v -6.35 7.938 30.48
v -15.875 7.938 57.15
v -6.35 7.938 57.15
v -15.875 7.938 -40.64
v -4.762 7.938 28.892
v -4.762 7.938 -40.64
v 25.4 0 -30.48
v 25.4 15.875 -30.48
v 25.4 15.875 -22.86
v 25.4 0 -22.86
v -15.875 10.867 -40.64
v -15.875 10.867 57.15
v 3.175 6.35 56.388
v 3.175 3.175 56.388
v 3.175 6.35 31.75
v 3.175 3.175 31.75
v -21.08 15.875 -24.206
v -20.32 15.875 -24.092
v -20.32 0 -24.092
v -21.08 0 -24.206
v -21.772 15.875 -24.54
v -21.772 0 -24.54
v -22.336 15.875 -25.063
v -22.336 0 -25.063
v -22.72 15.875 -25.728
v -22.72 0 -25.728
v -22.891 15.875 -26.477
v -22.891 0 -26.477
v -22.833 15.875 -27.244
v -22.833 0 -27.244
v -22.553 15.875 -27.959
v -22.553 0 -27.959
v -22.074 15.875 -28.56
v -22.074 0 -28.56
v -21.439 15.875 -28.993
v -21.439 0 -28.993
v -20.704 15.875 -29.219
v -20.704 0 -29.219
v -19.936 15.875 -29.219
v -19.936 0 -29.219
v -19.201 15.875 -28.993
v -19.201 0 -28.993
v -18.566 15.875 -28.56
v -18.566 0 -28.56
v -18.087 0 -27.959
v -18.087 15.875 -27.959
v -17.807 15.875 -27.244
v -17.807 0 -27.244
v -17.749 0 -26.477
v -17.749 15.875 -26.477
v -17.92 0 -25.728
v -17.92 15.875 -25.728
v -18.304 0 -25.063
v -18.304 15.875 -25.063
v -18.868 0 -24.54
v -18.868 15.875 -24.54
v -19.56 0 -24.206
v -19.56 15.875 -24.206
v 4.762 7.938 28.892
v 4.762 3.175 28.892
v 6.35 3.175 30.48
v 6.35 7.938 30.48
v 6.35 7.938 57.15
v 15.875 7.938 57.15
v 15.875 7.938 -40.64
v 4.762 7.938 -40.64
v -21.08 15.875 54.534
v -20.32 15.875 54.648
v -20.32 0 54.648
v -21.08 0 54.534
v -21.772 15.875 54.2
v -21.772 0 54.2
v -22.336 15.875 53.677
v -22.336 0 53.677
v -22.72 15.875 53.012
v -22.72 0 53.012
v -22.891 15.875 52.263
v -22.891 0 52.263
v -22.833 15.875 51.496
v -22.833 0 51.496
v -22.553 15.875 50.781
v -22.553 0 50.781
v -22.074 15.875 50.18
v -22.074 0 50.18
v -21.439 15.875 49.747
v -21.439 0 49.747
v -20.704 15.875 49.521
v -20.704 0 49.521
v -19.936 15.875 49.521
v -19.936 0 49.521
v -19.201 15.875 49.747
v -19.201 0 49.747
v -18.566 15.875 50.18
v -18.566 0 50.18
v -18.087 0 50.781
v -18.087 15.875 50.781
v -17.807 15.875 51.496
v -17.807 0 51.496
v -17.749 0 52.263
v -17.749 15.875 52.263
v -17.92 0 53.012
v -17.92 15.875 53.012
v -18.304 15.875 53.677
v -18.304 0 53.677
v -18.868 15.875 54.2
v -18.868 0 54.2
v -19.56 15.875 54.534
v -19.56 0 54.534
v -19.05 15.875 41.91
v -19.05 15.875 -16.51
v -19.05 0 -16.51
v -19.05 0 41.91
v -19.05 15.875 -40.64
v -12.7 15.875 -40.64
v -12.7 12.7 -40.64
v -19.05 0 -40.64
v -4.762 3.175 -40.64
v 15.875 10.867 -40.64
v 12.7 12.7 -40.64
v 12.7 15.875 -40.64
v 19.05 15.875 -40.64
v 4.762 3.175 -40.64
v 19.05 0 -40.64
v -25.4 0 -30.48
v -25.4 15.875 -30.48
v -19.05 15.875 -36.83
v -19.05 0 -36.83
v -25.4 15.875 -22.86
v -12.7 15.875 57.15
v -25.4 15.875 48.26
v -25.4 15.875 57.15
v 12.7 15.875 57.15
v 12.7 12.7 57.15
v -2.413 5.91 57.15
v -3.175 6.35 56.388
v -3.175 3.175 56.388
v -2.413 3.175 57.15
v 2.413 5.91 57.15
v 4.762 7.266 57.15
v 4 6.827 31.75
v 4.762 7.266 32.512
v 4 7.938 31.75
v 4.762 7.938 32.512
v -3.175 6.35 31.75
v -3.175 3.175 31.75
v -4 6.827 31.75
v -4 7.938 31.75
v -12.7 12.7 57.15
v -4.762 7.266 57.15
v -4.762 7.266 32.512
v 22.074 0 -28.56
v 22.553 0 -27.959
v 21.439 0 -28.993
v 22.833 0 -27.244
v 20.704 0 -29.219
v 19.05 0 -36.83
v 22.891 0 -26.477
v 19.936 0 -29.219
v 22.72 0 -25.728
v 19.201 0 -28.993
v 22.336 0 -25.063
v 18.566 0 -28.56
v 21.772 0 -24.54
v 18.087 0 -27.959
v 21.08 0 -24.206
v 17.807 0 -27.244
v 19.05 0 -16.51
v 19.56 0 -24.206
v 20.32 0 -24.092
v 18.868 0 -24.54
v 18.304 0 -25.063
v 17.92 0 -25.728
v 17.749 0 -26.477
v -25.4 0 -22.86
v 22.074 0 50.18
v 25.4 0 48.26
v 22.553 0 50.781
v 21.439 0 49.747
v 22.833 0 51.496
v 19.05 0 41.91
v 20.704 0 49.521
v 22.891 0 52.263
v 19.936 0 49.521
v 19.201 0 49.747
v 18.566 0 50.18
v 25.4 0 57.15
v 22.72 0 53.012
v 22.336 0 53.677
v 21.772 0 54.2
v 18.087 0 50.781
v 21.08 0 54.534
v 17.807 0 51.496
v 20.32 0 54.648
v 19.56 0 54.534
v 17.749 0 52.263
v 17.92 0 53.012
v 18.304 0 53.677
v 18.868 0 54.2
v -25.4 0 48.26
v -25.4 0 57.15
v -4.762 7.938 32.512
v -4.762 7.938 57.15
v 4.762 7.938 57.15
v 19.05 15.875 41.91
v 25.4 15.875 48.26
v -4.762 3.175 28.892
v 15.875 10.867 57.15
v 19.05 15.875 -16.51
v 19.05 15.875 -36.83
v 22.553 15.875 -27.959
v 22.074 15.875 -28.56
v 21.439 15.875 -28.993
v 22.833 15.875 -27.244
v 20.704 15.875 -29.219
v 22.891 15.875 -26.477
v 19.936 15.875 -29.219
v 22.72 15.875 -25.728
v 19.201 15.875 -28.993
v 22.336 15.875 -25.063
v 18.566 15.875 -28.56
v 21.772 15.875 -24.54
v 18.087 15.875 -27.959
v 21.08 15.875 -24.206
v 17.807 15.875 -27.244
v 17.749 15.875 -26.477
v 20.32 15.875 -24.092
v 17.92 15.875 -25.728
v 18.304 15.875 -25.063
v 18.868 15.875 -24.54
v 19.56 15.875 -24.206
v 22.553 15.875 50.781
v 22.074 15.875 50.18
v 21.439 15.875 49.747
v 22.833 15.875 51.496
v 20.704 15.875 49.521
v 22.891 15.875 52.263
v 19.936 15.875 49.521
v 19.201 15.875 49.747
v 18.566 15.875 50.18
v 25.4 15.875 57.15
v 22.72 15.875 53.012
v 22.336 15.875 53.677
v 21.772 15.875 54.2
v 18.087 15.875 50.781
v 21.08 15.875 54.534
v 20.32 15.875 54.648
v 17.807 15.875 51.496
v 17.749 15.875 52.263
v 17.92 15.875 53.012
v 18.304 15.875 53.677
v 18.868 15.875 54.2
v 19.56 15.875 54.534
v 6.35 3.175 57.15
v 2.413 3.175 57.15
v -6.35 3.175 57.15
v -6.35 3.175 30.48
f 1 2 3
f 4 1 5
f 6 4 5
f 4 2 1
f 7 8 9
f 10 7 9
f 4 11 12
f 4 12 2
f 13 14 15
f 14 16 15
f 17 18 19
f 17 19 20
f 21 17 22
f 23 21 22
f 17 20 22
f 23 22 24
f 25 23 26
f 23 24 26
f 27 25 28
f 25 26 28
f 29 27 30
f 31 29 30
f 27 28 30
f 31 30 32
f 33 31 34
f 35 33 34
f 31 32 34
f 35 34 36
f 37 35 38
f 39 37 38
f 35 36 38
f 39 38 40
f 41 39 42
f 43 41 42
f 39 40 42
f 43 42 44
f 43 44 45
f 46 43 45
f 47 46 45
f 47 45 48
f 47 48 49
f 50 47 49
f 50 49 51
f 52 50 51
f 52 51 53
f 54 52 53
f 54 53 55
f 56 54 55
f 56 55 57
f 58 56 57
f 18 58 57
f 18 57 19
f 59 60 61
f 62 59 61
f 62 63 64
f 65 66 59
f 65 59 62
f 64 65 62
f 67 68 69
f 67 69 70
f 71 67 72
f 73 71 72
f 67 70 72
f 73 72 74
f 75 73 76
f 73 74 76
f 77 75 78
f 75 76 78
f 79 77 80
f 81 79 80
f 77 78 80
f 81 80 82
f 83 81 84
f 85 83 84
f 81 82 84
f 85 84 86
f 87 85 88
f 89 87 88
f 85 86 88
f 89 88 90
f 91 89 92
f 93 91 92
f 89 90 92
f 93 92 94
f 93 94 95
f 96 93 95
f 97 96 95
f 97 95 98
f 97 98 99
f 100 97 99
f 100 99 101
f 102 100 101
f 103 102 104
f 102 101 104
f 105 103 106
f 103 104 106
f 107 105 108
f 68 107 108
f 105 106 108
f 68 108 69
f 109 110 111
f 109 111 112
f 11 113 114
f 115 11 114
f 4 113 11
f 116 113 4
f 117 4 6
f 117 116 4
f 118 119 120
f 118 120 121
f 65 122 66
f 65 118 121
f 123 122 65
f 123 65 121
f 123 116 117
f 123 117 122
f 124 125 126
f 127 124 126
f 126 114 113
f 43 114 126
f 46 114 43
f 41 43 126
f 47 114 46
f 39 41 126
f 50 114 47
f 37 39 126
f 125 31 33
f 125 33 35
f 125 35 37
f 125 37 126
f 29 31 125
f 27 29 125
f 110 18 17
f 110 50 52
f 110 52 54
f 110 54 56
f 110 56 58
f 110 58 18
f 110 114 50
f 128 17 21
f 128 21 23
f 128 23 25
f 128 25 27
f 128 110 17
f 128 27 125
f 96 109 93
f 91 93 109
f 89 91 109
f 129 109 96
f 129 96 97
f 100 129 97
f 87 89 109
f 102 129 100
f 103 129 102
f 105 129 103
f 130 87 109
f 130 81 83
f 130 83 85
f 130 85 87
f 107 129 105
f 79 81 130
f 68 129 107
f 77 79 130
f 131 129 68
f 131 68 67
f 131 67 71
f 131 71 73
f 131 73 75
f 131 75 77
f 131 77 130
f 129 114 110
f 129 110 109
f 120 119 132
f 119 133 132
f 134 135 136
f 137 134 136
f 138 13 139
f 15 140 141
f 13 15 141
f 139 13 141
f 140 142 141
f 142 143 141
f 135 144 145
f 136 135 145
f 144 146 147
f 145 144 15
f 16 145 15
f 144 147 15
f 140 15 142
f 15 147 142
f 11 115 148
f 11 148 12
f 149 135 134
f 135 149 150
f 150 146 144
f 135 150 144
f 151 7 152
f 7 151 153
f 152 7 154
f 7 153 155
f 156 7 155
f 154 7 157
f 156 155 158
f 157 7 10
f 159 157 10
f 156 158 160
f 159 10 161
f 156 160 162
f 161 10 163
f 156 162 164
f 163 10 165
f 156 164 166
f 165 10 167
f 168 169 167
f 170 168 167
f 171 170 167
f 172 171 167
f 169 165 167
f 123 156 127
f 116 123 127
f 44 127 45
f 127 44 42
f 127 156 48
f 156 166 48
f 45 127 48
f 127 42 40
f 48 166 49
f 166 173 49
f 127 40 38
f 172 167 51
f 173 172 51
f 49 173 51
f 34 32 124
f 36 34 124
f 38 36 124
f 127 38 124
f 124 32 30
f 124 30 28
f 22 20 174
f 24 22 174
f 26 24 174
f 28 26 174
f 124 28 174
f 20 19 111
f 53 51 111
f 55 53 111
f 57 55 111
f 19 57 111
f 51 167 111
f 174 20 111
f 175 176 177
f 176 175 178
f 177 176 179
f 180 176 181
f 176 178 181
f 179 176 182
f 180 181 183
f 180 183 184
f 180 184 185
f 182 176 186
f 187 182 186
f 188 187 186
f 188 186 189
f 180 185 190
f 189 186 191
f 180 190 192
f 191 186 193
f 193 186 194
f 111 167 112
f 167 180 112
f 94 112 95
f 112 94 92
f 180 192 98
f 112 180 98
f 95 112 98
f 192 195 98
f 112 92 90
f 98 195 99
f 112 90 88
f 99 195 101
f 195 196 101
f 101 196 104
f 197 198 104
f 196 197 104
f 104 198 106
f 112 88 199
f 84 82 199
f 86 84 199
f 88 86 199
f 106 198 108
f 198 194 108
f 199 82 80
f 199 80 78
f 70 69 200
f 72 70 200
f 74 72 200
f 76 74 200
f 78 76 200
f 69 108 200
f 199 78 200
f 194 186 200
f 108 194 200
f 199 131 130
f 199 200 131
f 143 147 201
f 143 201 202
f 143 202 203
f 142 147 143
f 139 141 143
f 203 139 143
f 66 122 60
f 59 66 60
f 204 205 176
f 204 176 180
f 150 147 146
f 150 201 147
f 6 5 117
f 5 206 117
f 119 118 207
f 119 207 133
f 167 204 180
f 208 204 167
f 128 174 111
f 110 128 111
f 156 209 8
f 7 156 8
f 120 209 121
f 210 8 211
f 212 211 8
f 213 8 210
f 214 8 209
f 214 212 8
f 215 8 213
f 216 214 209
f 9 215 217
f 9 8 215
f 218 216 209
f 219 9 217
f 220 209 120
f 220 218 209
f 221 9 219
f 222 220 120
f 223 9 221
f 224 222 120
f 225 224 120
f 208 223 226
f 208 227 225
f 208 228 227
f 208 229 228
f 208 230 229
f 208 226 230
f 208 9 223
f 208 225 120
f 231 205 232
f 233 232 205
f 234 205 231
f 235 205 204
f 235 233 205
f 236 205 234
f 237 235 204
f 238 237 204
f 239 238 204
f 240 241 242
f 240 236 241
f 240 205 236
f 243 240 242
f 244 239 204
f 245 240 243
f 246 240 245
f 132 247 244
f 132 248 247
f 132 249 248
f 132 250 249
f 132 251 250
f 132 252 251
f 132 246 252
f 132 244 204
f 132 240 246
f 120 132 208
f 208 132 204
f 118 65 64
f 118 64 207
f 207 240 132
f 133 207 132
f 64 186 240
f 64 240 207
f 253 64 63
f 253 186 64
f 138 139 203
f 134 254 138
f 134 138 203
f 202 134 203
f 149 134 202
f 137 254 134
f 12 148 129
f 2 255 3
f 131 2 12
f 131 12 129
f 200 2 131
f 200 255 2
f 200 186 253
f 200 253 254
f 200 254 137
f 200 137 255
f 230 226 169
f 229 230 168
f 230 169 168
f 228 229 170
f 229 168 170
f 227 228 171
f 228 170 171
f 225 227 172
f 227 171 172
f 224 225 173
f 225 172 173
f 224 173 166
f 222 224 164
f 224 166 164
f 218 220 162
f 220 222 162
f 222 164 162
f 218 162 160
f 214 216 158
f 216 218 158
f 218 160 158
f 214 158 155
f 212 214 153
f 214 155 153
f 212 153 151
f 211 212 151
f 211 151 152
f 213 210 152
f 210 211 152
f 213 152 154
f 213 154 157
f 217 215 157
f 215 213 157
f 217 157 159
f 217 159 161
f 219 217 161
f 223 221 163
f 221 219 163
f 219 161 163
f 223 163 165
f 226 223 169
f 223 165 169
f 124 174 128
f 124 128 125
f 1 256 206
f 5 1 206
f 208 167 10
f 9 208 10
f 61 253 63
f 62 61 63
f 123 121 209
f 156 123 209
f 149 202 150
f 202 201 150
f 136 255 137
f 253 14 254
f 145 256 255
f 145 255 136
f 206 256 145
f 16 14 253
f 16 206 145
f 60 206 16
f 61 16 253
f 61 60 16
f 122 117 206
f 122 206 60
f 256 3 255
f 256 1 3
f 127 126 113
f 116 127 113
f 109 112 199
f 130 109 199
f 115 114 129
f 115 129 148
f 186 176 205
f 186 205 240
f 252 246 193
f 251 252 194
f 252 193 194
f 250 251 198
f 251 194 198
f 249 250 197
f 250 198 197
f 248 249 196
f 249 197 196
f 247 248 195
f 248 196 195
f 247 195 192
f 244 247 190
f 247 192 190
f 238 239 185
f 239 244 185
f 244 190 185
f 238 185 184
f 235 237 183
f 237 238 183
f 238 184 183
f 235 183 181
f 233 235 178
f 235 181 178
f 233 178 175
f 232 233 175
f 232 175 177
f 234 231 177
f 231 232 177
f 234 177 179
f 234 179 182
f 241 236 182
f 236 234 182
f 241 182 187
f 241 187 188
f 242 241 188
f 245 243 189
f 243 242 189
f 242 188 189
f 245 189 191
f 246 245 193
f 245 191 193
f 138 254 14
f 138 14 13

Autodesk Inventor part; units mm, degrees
ref_plane "YZ Plane" through (0, 0, 0) normal (1, 0, 0) x (0, 1, 0)
ref_plane "XZ Plane" through (0, 0, 0) normal (0, 1, 0) x (-1, 0, 0)
sketch "Sketch1" plane through (0, 0, 0) normal (0, 1, 0) x (-1, 0, 0)
  line L0 (-25.4, 57.15) -> (25.4, 57.15)
  line L1 (25.4, 57.15) -> (25.4, -57.15)
  line L2 (25.4, -57.15) -> (-25.4, -57.15)
  line L3 (-25.4, -57.15) -> (-25.4, 57.15)
  line L4 (-25.4, 57.15) -> (25.4, -57.15) construction
  line L5 (25.4, 57.15) -> (-25.4, -57.15) construction
  point P0 (0, 0)
  dimension "d0" = 50.8
  dimension "d1" = 114.3
extrude "Extrusion1" add sketch "Sketch1" along normal blind 15.875
ref_plane "Work Plane1" through (-25.4, 0, 31.75) normal (0, 0, 1) x (1, 0, 0)
sketch "Sketch2" plane through (-25.4, 0, 31.75) normal (0, 0, 1) x (1, 0, 0)
  line L0 (50.8, 0) -> (0, 0) construction
  line L1 (50.8, 0) -> (50.8, 15.875) construction
  line L2 (0, 15.875) -> (50.8, 15.875) construction
  line L3 (0, 0) -> (0, 15.875) construction
  line L4 (0, 15.875) -> (50.8, 15.875) construction
  line L5 (25.4, 15.875) -> (25.4, 0) construction
  line L6 (50.8, 0) -> (0, 0) construction
  line L7 (6.35, 15.875) -> (6.35, 0) construction
  circle A0 centre (25.4, 16.891) radius 5.08 construction
  line L8 (12.7, 15.875) -> (12.7, 12.7)
  line L9 (12.7, 12.7) -> (9.525, 10.8669)
  line L10 (9.525, 10.8669) -> (9.525, 7.9375)
  line L11 (9.525, 7.9375) -> (19.05, 7.9375)
  line L12 (19.05, 7.9375) -> (19.05, 3.175)
  line L13 (19.05, 3.175) -> (25.4, 3.175)
  line L14 (12.7, 15.875) -> (25.4, 15.875)
  line L15 (25.4, 15.875) -> (25.4, 3.175)
  line L16 (19.05, 7.9375) -> (25.4, 7.9375)
  line L17 (20.6375, 7.9375) -> (20.6375, 7.2665)
  line L18 (20.6375, 7.2665) -> (22.225, 6.35)
  line L19 (22.225, 6.35) -> (22.225, 3.175)
  point P0 (22.225, 4.7625)
  point P1 (19.05, 5.5562)
  dimension "d20" = 6.35
  dimension "d21" = 10.16
  dimension "d22" = 6.35
  dimension "d23" = 4.7625
  dimension "d24" = 3.175
  dimension "d25" = 3.175
  dimension "d26" = 30
  dimension "d27" = 3.175
  dimension "d28" = 3.175
  dimension "d29" = 1.016
  dimension "d45" = 1.5875
  dimension "d46" = 3.175
  dimension "d48" = 3.175
  dimension "d50" = 30
extrude "Extrusion2" cut sketch "Sketch2" against normal through all
extrude "Extrusion3" cut sketch "Sketch2" along normal through all contours L14 L15 L16 L11 L10 L9 L8 | L17 L18 L19 L13 L12 L16
sketch "Sketch7" plane through (-6.35, 3.175, -57.15) normal (0, 1, 0) x (1, 0, 0)
  line L0 (0, -114.3) -> (0, 0) construction
  line L1 (6.35, -114.3) -> (1.5875, -114.3) construction
  line L2 (6.35, -88.9) -> (6.35, -114.3) construction
  line L3 (1.5875, -88.9) -> (6.35, -88.9) construction
  line L4 (1.5875, -88.9) -> (1.5875, -114.3) construction
  line L5 (0, -87.63) -> (1.5875, -86.0425)
  line L6 (1.5875, -86.0425) -> (1.5875, 0)
  line L7 (-19.05, 0) -> (31.75, 0) projected
  line L8 (0, 0) -> (1.5875, 0)
  line L9 (0, 0) -> (0, -87.63)
  point P0 (6.35, -57.15)
  dimension "d63" = 135
  dimension "d64" = 1.5875
  dimension "d65" = 1.27
extrude "Extrusion6" add sketch "Sketch7" along normal up to surface (4.7625 mm away)
chamfer "Chamfer2" distance 0.762 angle 45 2 edges at (-4.7625, 7.602, 31.75) (-3.175, 4.7625, 57.15)
sketch "Sketch8" plane through (0, 15.875, 0) normal (0, 1, 0) x (1, 0, 0)
  circle A0 centre (-20.32, 26.67) radius 2.5797 construction
  line L0 (-12.7, 57.15) -> (-25.4, 57.15) construction
  line L1 (-25.4, 57.15) -> (-25.4, -57.15) construction
  line L2 (-15.875, -57.15) -> (-15.875, 57.15) construction
  line L3 (-25.4, -57.15) -> (25.4, -57.15) projected
  line L4 (-25.4, 22.86) -> (-19.05, 16.51)
  line L5 (-19.05, 16.51) -> (-19.05, -41.91)
  line L6 (-19.05, -41.91) -> (-25.4, -48.26)
  line L7 (-25.4, 22.86) -> (-25.4, -48.26)
  line L8 (-25.4, -57.15) -> (-25.4, 57.15) construction
  line L9 (-25.4, 30.48) -> (-19.05, 36.83)
  line L10 (-19.05, 36.83) -> (-19.05, 57.15)
  line L11 (-25.4, 30.48) -> (-25.4, 22.86) construction
  line L12 (-25.4, 30.48) -> (-25.4, 57.15)
  line L13 (-25.4, 57.15) -> (-19.05, 57.15)
  point P0 (0, 0)
  point P1 (-20.32, -52.07)
  point P2 (-12.7, -57.15)
  point P3 (-25.4, 26.67)
  dimension "d71" = 5.1594
  dimension "d72" = 30.48
  dimension "d73" = 5.08
  dimension "d75" = 135
  dimension "d76" = 135
  dimension "d77" = 3.175
  dimension "d89" = 34.29
  dimension "d91" = 5.08
  dimension "d92" = 8.89
hole "Hole2" at (-20.32, 15.875, -26.67) at (-20.32, 15.875, 52.07) direction (0, -1, 0) diameter 5.1562 end through all
extrude "Extrusion7" cut sketch "Sketch8" against normal through all
mirror "Mirror1" about plane through (0, 15.875, 31.75) normal (-1, 0, 0) of "Extrusion2", "Extrusion3", "Extrusion7", "Hole2", "Chamfer2", "Extrusion6"
sketch "Sketch9" plane through (0, 0, 0) normal (0, -1, 0) x (1, 0, 0)
  line L0 (19.05, -57.15) -> (19.05, -36.83) projected
  line L1 (19.05, -57.15) -> (12.7, -57.15) projected
  line L2 (-19.05, -57.15) -> (-19.05, -36.83) projected
  line L3 (19.05, -57.15) -> (-19.05, -57.15)
  line L4 (-19.05, -57.15) -> (-19.05, -40.64)
  line L5 (-19.05, -40.64) -> (19.05, -40.64)
  line L6 (19.05, -40.64) -> (19.05, -57.15)
  point P0 (0, 0)
  dimension "d93" = 16.51
extrude "Extrusion8" cut sketch "Sketch9" against normal through all
equation "\"d76\" = d75"
properties part number "Holder_Mount" material "ABS Plastic"
